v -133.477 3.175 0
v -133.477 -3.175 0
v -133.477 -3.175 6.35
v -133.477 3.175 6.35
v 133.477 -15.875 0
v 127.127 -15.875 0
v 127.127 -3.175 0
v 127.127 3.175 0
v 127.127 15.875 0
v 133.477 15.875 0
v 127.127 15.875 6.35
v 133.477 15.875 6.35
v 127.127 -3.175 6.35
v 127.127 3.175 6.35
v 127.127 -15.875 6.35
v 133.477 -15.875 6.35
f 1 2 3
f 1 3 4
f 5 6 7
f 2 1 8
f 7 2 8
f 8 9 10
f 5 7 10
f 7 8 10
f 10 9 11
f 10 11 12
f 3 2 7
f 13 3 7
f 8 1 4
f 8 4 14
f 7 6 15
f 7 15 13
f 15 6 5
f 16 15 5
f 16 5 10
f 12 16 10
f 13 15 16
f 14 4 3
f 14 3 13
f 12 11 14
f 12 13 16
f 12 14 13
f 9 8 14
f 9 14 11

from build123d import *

# Parameters (mm, degrees)
SKETCH1_W           = 266.954
SKETCH1_H           = 6.35
SKETCH1_W_2         = 6.35
SKETCH1_H_2         = 12.7
BOSS_EXTRUDE1_DEPTH = 6.35


with BuildPart() as part:
    # Sketch1 → Boss-Extrude1 (new body)
    with BuildSketch(Plane.XY):
        Rectangle(SKETCH1_W, SKETCH1_H)
        with Locations((130.302, 9.525)):
            Rectangle(SKETCH1_W_2, SKETCH1_H_2)
        with Locations((130.302, -9.525)):
            Rectangle(SKETCH1_W_2, SKETCH1_H_2)
    extrude(amount=BOSS_EXTRUDE1_DEPTH)


solid = part.part
